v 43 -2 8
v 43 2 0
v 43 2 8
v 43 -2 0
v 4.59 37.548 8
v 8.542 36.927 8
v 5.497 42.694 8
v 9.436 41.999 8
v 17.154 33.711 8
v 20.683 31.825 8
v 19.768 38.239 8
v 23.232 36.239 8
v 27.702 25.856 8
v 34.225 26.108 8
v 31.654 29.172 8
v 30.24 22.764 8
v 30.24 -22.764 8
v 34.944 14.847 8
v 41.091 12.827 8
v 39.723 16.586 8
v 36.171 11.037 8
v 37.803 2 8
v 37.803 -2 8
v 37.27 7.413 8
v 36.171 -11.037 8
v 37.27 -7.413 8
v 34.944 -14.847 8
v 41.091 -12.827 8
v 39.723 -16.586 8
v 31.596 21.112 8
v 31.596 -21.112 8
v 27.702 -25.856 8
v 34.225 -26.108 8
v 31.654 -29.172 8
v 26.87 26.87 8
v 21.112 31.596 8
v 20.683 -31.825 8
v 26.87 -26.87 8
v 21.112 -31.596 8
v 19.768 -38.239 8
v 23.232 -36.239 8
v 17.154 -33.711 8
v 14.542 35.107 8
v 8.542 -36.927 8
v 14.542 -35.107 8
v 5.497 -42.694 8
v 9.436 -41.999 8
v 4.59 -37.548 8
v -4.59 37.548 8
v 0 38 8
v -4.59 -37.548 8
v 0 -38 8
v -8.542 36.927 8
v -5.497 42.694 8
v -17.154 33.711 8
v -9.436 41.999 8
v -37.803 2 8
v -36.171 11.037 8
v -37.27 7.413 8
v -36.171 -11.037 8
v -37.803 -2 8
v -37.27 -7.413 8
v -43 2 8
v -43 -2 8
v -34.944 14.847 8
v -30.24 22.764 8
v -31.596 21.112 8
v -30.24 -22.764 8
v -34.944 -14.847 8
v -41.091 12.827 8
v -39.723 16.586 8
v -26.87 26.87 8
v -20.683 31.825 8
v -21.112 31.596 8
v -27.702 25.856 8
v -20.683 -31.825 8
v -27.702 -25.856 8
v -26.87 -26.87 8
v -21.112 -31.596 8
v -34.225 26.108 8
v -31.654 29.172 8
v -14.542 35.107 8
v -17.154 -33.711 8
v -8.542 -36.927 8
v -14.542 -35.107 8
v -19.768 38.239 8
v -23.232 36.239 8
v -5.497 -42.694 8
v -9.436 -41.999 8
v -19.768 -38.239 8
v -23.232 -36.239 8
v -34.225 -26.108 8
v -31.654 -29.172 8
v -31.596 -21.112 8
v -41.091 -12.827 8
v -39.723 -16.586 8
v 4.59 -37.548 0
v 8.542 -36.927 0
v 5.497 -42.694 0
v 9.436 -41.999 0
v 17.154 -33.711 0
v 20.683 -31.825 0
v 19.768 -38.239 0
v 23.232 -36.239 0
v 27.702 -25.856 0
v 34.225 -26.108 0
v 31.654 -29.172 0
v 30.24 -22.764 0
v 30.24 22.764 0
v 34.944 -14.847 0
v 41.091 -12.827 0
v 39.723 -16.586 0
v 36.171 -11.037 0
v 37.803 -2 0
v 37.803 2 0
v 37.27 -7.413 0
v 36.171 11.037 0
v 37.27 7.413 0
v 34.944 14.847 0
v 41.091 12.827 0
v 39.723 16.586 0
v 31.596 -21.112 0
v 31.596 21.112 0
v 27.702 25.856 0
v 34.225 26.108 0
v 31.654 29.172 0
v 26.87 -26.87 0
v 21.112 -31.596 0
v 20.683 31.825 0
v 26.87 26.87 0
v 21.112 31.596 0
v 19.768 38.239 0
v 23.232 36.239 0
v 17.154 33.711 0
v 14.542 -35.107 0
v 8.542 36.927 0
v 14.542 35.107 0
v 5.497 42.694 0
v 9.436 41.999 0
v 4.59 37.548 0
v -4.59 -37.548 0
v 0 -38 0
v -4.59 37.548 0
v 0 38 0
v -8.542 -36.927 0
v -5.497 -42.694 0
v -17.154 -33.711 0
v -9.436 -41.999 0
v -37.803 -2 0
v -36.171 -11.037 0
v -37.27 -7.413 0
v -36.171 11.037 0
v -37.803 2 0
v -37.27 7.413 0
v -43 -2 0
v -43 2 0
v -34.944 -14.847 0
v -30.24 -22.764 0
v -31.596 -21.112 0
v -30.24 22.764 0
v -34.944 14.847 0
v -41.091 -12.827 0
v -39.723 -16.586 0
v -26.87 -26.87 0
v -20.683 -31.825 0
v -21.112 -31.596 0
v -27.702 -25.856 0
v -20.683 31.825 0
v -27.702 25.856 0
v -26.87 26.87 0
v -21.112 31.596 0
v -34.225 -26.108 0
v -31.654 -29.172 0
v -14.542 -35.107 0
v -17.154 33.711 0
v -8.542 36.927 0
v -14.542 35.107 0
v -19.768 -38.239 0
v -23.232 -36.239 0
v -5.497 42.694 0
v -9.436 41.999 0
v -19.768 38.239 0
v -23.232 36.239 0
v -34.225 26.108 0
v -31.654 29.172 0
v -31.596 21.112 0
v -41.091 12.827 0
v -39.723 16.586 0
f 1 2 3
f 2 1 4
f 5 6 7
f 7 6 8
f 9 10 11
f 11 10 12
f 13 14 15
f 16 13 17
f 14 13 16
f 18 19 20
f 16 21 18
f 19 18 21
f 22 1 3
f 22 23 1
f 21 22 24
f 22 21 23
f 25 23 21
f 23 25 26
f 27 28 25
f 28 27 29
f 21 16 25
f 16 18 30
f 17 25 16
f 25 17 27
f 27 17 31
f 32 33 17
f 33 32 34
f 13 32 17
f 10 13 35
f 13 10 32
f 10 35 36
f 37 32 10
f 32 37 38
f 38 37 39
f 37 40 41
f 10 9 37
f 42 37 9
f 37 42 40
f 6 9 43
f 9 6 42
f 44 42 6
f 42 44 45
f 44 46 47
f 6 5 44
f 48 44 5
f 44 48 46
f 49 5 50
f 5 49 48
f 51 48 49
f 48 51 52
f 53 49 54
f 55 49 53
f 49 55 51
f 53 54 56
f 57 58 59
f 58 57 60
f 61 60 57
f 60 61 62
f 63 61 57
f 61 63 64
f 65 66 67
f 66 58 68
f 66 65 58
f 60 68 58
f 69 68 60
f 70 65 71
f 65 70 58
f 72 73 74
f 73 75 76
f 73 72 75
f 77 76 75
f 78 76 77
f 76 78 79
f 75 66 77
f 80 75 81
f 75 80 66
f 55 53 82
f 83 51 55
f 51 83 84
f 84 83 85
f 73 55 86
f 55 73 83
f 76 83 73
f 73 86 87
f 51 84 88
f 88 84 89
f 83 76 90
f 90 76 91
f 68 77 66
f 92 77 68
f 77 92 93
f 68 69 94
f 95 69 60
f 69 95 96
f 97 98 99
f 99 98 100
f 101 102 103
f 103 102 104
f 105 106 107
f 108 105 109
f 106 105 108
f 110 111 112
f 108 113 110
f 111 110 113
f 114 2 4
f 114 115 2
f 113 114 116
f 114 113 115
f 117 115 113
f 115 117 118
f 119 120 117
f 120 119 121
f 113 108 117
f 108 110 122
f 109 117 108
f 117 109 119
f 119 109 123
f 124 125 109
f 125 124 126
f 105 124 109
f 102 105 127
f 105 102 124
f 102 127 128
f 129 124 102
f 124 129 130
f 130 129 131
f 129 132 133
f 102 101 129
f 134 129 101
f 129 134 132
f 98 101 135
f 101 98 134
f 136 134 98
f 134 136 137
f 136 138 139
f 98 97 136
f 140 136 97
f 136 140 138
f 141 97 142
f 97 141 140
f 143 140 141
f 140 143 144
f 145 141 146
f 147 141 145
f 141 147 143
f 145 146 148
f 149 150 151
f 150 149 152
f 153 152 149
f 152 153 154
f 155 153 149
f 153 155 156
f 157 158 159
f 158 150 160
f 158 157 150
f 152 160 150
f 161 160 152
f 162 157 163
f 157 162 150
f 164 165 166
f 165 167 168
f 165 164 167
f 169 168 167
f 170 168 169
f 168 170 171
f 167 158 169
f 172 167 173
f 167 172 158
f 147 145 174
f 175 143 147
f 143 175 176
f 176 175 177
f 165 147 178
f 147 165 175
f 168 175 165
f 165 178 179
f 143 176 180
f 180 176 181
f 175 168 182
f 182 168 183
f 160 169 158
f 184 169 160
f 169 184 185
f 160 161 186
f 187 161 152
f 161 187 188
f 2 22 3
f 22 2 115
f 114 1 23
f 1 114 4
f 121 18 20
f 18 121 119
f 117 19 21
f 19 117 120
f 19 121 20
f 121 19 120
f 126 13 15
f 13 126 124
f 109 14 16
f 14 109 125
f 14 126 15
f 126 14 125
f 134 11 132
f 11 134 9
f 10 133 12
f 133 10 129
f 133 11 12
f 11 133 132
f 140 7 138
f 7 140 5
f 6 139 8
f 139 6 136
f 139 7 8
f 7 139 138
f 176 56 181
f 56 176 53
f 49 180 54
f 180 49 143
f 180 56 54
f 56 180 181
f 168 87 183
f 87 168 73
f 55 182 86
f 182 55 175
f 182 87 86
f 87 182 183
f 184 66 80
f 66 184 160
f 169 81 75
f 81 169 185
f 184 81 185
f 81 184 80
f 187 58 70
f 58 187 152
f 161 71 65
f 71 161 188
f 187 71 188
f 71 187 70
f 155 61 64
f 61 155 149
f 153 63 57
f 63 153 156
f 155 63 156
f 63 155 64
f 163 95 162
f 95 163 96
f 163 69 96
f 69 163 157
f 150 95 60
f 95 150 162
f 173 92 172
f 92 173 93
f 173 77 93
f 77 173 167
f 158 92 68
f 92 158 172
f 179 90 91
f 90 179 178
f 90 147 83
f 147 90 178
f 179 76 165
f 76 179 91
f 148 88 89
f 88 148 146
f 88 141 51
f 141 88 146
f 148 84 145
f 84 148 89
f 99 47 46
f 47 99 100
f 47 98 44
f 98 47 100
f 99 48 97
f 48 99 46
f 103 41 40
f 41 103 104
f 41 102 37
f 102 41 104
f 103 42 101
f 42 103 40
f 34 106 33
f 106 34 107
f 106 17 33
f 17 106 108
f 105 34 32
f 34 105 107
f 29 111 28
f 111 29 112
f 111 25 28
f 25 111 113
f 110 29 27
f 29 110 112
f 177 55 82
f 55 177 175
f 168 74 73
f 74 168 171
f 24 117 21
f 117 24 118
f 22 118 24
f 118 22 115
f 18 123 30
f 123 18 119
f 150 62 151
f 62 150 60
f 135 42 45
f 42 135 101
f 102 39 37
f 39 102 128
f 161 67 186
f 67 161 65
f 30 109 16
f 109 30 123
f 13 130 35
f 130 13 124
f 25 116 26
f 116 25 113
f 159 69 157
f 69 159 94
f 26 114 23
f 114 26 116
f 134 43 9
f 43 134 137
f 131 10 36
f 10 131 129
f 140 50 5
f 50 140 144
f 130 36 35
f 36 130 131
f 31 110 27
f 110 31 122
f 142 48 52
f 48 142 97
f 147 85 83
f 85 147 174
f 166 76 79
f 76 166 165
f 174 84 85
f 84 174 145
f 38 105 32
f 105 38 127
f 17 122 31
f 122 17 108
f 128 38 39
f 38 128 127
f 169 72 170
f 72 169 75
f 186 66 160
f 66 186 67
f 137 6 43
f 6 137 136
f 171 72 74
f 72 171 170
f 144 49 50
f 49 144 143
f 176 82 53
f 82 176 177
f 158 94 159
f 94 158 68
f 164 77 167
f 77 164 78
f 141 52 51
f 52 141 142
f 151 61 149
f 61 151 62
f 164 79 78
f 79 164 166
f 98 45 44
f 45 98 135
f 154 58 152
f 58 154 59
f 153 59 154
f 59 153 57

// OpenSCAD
$fn = 32;

// ----------------------------------------------------------------------
// Spur blank: plain gear blank
// ----------------------------------------------------------------------

// --- parameters (mm) ---
disc_r = 38;              // blank root radius
disc_t = 8;               // blank thickness
n_teeth = 18;             // stub tooth count
tooth_w = 4;              // tooth width at the root
tooth_h = 5;              // tooth height above the root

out_r = disc_r + tooth_h;  // tip radius
bbox_x = 86.0;  // measured width over the teeth
bbox_y = 85.39;  // measured depth over the teeth

union() {
  cylinder(r = disc_r, h = disc_t);
  for (i = [0 : n_teeth - 1])
    rotate([0, 0, i * 360 / n_teeth])
      translate([disc_r - 1, -tooth_w / 2, 0])
        cube([tooth_h + 1, tooth_w, disc_t]);
}
